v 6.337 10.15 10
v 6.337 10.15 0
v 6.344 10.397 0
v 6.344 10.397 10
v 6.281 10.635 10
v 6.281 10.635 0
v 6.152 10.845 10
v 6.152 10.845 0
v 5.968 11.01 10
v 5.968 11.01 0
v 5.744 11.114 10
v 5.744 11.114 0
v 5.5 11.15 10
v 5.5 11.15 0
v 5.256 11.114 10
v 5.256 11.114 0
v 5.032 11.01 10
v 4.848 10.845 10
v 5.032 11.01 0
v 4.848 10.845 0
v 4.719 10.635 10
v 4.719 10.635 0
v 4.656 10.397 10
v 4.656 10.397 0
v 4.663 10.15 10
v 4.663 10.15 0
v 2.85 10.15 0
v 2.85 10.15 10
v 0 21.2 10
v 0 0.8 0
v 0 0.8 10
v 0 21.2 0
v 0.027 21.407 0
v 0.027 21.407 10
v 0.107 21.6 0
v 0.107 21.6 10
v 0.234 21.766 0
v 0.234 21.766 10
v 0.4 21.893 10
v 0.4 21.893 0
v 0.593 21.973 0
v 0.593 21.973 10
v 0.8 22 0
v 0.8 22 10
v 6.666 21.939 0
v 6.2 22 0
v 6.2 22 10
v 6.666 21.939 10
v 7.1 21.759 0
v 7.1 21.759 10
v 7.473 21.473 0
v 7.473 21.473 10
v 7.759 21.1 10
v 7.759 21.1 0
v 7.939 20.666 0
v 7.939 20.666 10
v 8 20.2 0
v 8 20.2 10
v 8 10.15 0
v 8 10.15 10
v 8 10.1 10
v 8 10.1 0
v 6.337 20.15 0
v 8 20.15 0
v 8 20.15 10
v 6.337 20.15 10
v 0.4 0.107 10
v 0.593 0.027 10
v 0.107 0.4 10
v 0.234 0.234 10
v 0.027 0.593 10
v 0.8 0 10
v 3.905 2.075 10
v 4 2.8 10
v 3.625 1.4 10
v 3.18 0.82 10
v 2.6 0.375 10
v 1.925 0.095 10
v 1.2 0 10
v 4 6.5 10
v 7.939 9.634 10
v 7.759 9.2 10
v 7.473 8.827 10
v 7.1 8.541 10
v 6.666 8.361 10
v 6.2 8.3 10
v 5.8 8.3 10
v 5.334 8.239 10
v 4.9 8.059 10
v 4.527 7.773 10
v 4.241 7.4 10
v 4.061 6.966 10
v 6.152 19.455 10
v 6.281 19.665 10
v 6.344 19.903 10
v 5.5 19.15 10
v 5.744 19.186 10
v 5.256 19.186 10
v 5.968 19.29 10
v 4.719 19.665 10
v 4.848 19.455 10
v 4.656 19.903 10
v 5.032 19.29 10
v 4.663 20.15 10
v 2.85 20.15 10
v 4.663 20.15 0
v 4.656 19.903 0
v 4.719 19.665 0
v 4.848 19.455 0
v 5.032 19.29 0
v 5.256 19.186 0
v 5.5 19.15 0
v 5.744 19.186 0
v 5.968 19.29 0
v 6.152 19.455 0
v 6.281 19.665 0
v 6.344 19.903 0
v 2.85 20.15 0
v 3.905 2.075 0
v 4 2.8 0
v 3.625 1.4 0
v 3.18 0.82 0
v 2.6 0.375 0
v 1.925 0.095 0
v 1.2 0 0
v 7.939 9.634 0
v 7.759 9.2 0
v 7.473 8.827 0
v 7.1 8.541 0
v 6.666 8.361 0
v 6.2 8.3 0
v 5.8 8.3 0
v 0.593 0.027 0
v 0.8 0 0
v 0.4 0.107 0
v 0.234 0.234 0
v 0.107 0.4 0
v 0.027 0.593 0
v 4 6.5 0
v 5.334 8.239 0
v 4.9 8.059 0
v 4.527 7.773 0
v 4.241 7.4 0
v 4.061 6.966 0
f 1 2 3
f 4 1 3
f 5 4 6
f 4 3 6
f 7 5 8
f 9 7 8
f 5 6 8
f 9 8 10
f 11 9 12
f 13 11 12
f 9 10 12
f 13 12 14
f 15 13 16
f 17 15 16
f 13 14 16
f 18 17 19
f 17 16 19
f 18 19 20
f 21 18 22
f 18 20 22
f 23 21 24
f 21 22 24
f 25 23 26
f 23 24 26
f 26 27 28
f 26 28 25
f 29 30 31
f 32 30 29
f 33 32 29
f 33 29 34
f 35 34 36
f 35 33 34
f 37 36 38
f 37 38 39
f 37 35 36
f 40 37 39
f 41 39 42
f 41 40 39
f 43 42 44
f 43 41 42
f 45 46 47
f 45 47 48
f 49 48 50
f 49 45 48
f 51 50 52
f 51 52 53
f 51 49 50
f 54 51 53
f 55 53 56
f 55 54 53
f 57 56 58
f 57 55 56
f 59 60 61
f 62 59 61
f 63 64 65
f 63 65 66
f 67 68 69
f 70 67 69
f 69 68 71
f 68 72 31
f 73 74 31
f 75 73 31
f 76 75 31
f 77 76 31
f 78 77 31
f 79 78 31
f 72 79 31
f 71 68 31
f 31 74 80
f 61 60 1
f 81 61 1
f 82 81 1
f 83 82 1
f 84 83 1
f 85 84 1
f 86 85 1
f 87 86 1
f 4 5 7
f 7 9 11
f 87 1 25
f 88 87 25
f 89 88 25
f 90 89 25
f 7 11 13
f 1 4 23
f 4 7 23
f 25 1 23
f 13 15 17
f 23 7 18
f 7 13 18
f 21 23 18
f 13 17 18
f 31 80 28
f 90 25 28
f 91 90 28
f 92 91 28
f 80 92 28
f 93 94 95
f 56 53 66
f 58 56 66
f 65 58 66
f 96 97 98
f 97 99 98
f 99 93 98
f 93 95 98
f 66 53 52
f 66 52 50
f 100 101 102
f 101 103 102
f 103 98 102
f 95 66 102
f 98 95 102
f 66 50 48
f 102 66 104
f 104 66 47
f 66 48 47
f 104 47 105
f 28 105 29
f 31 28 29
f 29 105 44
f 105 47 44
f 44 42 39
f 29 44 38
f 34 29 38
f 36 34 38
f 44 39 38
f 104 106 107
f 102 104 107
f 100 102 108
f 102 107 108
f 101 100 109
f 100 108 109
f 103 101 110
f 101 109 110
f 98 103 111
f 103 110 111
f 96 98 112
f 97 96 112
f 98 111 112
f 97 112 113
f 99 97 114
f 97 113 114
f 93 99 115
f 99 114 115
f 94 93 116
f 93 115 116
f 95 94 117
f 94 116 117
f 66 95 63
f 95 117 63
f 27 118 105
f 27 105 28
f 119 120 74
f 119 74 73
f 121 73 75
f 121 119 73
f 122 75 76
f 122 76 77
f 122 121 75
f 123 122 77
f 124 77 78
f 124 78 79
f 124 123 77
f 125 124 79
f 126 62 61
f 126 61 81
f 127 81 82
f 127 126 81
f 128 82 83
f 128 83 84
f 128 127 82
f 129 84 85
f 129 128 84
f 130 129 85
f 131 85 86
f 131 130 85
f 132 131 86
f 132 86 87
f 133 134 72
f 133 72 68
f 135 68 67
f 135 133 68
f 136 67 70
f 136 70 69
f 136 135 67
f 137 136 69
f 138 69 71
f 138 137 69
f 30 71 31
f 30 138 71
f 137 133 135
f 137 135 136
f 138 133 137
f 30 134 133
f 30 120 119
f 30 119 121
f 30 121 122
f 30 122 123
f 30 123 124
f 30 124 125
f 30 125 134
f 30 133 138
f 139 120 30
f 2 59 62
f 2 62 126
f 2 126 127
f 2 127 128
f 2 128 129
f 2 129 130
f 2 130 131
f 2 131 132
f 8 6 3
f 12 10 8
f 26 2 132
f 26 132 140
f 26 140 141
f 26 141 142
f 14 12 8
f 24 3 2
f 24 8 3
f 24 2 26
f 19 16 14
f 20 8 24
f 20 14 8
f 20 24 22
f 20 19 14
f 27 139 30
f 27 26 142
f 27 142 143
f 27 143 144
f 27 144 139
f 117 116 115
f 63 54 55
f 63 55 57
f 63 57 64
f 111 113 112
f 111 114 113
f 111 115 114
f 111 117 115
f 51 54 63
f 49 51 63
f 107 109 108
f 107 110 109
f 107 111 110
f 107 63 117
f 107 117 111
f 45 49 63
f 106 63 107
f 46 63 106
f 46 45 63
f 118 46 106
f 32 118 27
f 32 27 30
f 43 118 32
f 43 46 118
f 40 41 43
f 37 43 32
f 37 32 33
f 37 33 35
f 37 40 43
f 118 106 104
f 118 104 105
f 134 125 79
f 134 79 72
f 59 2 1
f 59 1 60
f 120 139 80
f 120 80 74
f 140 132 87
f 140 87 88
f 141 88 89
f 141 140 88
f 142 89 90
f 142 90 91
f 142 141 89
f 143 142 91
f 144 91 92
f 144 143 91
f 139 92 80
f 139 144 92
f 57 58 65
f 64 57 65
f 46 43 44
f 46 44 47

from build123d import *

# Parameters (mm, degrees)
BOSS_EXTRUDE1_DEPTH = 10


with BuildPart() as part:
    # Sketch4 → Boss-Extrude1 (new body)
    with BuildSketch(Plane.XY):
        with BuildLine():
            ThreePointArc((0.8, 0), (0.234314575, 0.234314575), (0, 0.8))
            Line((0, 0.8), (0, 21.2))
            ThreePointArc((0, 21.2), (0.234314575, 21.765685425), (0.8, 22))
            Line((0.8, 22), (6.2, 22))
            ThreePointArc((6.2, 22), (7.472792206, 21.472792206), (8, 20.2))
            Line((8, 20.2), (8, 20.15))
            Line((8, 20.15), (2.85, 20.15))
            Line((2.85, 20.15), (2.85, 10.15))
            Line((2.85, 10.15), (8, 10.15))
            Line((8, 10.15), (8, 10.1))
            ThreePointArc((8, 10.1), (7.472792206, 8.827207794), (6.2, 8.3))
            Line((6.2, 8.3), (5.8, 8.3))
            ThreePointArc((5.8, 8.3), (4.527207794, 7.772792206), (4, 6.5))
            Line((4, 6.5), (4, 2.8))
            ThreePointArc((4, 2.8), (3.179898987, 0.820101013), (1.2, 0))
            Line((1.2, 0), (0.8, 0))
        make_face()
        with BuildLine():
            ThreePointArc((4.663339973, 20.15), (5.5, 19.15), (6.336660027, 20.15))
            Line((6.336660027, 20.15), (4.663339973, 20.15))
        make_face()
        with BuildLine():
            Line((4.663339973, 10.15), (6.336660027, 10.15))
            ThreePointArc((6.336660027, 10.15), (5.5, 11.15), (4.663339973, 10.15))
        make_face()
    extrude(amount=BOSS_EXTRUDE1_DEPTH)


solid = part.part
